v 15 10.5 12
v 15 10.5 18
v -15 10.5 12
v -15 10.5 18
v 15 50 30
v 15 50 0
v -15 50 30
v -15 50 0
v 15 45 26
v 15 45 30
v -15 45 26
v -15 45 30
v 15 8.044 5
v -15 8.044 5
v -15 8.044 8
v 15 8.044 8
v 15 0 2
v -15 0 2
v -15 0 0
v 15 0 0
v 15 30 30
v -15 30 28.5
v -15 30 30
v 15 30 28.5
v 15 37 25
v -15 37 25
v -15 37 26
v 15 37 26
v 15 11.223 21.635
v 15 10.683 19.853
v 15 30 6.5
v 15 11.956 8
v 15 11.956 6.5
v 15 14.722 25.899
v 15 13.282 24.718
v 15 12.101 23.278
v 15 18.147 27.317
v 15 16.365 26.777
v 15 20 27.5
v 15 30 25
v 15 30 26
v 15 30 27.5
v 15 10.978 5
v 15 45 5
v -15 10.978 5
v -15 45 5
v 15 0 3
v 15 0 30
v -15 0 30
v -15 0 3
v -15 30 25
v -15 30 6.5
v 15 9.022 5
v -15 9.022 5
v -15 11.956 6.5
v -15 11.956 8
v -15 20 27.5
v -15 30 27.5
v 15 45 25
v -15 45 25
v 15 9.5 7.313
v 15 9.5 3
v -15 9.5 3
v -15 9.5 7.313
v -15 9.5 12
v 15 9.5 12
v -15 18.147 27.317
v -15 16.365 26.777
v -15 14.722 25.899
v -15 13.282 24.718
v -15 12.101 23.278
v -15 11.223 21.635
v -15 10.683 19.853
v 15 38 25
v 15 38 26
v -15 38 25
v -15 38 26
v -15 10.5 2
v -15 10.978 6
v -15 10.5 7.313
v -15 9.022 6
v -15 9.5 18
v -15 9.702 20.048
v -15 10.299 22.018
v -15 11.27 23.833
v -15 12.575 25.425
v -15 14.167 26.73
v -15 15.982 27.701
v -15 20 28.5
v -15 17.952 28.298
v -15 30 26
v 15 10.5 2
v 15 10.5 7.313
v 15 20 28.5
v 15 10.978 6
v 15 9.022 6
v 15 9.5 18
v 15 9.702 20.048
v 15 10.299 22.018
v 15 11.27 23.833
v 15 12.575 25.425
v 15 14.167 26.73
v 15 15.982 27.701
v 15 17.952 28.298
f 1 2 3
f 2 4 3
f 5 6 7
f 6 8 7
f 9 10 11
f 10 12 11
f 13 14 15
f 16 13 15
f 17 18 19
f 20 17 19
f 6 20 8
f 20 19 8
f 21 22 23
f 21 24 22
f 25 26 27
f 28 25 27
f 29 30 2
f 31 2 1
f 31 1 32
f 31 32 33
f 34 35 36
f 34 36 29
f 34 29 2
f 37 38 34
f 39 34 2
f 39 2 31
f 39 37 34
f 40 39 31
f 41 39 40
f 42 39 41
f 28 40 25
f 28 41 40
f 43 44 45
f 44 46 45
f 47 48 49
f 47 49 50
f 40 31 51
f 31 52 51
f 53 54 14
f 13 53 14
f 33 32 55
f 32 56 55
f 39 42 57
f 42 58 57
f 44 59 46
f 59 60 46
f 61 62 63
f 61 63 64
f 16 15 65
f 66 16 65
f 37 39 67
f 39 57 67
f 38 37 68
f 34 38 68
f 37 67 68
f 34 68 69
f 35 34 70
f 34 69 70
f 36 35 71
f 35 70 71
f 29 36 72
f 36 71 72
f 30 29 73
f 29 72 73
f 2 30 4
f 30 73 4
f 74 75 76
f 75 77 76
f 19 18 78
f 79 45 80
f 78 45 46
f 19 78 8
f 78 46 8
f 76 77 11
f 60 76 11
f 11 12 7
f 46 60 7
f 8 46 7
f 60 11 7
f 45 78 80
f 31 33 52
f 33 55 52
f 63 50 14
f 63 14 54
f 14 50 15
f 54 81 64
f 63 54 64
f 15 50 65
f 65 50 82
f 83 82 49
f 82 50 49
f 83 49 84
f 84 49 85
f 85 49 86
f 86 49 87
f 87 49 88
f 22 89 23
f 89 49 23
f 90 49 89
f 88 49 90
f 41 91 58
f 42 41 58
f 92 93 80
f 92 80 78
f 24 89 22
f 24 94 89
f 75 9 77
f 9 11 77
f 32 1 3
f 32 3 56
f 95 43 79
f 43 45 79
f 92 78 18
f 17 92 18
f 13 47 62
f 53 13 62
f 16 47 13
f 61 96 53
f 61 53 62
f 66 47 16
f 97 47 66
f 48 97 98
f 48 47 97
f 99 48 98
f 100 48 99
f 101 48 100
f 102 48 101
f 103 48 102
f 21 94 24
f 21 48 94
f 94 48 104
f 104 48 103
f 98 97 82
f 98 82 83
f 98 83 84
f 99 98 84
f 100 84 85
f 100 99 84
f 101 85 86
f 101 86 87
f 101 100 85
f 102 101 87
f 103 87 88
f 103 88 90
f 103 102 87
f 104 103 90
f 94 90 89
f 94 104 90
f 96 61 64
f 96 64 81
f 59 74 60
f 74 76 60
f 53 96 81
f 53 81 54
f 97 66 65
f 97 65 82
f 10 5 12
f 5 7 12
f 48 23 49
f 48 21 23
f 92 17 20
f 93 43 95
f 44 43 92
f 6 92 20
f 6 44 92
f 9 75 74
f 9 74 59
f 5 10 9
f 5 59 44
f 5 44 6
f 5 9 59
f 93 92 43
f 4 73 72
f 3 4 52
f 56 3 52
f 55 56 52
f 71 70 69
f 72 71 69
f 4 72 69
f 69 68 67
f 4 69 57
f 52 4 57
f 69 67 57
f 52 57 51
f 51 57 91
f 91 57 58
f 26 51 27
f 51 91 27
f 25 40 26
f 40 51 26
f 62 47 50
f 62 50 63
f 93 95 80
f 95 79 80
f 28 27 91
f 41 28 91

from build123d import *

# Parameters (mm, degrees)
F1_DEPTH = 15


with BuildPart() as f1:
    # F0 (on Right) → F1 (new body, symmetric)
    with BuildSketch(Plane.YZ):
        Polygon((0, 2), (0, 0), (50, 0), (50, 30), (45, 30), (45, 26), (38, 26), (38, 25), (45, 25), (45, 5), (30, 5), (11.955881, 5), (10.97794, 5), (10.97794, 6), (10.5, 7.313131), (10.5, 5), (10.5, 2), align=None)
        with BuildLine():
            Line((30, 26), (30, 27.5))
            Line((30, 27.5), (20, 27.5))
            ThreePointArc((20, 27.5), (13.282486, 24.717514), (10.5, 18))
            Line((10.5, 18), (10.5, 12))
            Line((10.5, 12), (11.955881, 8))
            Line((11.955881, 8), (11.955881, 6.5))
            Line((11.955881, 6.5), (30, 6.5))
            Line((30, 6.5), (30, 25))
            Line((30, 25), (37, 25))
            Line((37, 25), (37, 26))
            Line((37, 26), (30, 26))
        make_face()
        with BuildLine():
            Line((30, 30), (0, 30))
            Line((0, 30), (0, 3))
            Line((0, 3), (9.5, 3))
            Line((9.5, 3), (9.5, 5))
            Line((9.5, 5), (9.5, 7.313131))
            Line((9.5, 7.313131), (9.02206, 6))
            Line((9.02206, 6), (9.02206, 5))
            Line((9.02206, 5), (8.044119, 5))
            Line((8.044119, 5), (8.044119, 8))
            Line((8.044119, 8), (9.5, 12))
            Line((9.5, 12), (9.5, 18))
            ThreePointArc((9.5, 18), (12.575379, 25.424621), (20, 28.5))
            Line((20, 28.5), (30, 28.5))
            Line((30, 28.5), (30, 30))
        make_face()
    extrude(amount=F1_DEPTH, both=True)


solid = f1.part
